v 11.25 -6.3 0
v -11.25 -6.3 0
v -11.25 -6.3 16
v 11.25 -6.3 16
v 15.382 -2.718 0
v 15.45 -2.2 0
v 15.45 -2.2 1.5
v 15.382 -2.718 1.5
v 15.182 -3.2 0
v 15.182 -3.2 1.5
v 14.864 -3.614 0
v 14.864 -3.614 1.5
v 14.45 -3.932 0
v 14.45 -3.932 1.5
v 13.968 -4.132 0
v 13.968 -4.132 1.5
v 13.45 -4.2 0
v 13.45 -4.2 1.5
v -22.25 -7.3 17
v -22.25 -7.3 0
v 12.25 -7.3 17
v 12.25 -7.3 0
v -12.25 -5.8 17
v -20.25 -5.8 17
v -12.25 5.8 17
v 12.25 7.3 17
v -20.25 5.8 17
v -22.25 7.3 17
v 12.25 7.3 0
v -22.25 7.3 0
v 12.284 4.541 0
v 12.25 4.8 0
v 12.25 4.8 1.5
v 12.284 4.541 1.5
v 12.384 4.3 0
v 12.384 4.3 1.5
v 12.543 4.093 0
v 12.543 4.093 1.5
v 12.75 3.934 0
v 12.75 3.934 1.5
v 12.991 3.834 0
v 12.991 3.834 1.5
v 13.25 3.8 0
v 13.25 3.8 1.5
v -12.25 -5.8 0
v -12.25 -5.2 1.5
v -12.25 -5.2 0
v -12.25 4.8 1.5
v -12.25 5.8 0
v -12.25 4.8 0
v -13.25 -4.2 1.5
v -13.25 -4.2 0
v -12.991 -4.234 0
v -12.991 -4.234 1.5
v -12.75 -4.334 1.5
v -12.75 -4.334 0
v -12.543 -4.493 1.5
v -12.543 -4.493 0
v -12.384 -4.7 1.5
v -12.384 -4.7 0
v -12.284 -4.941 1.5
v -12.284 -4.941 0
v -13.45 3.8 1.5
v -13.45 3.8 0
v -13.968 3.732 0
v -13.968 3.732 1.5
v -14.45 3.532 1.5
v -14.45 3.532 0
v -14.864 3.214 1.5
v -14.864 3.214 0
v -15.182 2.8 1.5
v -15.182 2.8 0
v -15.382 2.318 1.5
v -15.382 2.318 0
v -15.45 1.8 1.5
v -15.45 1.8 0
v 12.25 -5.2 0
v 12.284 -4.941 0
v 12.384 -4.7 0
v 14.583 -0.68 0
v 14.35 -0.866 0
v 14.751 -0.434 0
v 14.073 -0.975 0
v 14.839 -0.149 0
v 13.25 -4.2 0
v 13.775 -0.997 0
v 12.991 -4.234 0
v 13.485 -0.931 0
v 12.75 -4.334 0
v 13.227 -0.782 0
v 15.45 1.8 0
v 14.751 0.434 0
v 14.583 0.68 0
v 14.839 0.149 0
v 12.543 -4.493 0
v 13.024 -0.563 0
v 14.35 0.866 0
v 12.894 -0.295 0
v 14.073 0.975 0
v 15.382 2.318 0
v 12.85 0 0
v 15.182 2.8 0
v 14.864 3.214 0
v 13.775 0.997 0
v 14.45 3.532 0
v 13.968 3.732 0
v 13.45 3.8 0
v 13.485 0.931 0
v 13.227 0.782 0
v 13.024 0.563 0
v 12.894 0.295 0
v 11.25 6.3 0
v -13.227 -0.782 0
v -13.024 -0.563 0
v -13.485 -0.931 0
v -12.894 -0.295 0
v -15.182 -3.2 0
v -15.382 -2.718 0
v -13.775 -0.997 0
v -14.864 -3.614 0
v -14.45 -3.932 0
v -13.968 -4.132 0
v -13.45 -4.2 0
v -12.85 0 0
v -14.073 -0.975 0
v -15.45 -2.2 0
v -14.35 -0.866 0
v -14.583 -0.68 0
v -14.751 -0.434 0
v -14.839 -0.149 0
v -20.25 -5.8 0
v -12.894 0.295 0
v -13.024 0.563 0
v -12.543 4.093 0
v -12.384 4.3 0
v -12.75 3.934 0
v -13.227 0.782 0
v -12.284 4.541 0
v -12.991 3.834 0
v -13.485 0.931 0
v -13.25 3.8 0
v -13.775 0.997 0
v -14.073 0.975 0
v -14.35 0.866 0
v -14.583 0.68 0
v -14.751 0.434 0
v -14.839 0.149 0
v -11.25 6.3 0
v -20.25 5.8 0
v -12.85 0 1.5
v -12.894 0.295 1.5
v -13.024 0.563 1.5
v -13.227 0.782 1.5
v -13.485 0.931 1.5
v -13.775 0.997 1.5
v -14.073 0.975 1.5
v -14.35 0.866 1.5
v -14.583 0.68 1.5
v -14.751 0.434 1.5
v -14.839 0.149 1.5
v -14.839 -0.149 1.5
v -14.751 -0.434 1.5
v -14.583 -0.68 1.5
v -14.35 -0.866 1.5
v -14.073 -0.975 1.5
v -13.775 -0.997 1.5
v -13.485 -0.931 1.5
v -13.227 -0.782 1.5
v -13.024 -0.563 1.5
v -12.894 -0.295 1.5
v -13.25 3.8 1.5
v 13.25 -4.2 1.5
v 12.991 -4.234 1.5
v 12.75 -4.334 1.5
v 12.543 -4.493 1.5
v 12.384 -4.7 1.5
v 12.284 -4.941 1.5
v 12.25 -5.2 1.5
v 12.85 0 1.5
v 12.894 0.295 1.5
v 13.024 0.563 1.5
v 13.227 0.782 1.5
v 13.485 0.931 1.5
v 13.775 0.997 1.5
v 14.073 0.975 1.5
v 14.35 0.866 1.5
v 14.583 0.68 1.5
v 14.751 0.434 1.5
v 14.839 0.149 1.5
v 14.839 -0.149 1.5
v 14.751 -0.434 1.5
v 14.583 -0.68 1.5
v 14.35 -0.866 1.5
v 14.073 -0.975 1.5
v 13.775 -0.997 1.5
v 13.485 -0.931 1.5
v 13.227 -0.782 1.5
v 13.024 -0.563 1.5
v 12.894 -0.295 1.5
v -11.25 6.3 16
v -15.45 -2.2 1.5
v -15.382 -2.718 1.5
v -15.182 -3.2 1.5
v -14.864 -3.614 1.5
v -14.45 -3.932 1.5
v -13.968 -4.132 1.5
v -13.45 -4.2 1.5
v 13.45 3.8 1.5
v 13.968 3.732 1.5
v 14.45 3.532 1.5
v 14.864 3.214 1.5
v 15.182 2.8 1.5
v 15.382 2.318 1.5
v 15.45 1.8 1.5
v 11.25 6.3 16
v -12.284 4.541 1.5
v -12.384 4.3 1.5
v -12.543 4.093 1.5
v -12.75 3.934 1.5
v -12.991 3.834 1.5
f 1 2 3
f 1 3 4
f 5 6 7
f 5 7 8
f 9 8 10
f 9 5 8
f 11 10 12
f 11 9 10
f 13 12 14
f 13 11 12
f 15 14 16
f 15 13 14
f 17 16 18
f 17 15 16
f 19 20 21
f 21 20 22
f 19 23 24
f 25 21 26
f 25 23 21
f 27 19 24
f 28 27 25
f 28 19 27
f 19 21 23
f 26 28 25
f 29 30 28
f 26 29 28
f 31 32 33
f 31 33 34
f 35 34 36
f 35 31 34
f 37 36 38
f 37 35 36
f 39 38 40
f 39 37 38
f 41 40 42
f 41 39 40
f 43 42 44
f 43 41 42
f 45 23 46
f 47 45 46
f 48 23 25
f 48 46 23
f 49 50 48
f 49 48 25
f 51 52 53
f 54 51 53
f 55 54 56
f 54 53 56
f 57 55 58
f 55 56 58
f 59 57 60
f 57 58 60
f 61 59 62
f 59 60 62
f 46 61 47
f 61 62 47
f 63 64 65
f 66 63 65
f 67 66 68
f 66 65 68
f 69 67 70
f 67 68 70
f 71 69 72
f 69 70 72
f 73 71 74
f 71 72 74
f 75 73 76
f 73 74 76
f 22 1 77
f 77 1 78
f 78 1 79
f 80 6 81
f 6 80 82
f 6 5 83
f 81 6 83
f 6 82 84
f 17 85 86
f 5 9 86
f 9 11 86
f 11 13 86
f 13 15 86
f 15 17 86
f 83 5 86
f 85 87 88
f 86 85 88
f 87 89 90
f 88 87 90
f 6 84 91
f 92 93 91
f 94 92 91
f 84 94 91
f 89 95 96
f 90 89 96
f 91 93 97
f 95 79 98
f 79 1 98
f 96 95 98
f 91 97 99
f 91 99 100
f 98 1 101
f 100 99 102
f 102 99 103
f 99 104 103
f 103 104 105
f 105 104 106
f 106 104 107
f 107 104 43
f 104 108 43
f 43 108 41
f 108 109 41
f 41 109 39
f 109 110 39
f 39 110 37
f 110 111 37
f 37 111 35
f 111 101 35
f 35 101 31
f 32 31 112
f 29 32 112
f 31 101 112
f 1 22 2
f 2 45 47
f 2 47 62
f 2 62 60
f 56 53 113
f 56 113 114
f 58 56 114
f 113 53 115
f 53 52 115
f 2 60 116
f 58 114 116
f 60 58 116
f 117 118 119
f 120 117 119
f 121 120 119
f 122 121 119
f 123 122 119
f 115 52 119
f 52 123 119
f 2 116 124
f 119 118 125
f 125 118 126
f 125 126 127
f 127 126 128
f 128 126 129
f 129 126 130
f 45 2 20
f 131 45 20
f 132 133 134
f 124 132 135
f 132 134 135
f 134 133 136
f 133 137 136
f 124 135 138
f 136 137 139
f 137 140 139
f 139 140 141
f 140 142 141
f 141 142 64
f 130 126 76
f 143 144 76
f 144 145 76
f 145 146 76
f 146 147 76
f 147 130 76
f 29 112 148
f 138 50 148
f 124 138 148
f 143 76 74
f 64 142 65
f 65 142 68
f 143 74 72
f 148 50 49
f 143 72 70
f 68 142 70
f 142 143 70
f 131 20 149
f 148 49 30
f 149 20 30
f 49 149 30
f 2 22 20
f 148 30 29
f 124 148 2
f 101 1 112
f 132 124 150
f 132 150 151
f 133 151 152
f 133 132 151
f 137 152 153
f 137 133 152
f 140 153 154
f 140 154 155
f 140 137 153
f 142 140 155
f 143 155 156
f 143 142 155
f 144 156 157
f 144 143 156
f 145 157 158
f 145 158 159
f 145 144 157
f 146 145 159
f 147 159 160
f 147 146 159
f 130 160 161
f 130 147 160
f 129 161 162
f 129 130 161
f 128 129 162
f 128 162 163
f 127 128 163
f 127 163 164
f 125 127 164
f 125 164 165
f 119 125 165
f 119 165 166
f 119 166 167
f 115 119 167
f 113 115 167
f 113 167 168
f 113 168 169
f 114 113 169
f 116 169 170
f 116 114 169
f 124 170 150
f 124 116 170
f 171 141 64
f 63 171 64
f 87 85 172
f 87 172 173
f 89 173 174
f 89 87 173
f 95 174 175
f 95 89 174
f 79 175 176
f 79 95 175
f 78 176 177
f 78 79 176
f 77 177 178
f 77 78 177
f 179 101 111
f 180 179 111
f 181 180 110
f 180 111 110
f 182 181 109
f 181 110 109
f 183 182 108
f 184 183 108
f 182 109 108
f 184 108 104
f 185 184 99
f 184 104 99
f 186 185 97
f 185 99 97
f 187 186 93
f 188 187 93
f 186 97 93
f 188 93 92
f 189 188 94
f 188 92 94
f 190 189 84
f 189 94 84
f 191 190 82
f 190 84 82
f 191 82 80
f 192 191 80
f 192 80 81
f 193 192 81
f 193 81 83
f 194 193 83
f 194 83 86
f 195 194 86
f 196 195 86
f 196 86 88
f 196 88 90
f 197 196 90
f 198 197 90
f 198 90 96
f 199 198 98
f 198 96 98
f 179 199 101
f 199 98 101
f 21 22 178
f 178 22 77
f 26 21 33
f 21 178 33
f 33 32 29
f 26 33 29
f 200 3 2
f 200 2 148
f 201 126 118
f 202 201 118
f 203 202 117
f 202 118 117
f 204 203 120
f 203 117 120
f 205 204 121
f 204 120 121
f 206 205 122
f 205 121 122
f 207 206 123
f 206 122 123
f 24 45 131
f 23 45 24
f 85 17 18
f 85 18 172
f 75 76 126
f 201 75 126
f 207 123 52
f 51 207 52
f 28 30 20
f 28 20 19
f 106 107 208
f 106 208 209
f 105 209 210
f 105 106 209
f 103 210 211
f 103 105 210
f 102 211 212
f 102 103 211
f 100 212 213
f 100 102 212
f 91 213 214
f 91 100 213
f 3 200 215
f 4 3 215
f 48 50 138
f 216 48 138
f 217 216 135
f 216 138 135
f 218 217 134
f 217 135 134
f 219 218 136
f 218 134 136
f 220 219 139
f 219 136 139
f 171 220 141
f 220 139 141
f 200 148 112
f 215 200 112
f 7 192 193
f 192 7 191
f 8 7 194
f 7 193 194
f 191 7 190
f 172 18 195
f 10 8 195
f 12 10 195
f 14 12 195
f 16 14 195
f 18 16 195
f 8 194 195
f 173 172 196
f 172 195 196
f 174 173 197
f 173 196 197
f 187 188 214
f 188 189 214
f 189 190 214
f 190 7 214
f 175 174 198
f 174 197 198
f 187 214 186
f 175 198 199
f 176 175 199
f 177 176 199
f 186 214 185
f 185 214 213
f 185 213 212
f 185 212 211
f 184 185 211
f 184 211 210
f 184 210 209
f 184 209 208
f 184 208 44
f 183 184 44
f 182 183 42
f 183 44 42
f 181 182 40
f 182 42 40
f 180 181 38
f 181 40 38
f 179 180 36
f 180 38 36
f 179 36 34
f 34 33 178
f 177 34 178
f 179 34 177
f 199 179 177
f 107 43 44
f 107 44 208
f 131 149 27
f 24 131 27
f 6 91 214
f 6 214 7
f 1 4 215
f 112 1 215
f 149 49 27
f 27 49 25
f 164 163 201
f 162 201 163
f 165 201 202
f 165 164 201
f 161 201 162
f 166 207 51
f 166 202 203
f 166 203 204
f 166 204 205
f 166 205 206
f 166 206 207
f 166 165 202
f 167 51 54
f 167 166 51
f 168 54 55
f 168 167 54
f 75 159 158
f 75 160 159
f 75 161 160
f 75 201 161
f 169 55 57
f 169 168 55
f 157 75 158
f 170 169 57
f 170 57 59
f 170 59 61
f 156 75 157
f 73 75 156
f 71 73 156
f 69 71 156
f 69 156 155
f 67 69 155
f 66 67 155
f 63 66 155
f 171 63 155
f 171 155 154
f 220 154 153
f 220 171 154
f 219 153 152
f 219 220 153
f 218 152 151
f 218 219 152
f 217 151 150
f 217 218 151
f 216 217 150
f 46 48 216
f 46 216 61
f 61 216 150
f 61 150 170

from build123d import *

# Parameters (mm, degrees)
SKETCH1_W           = 22.5
SKETCH1_H           = 12.6
BOSS_EXTRUDE1_DEPTH = 16
SHELL2_T            = 1
SKETCH2_R           = 1
BOSS_EXTRUDE2_DEPTH = 1.5
SKETCH5_W           = 17
SKETCH5_H           = 1.5
BOSS_EXTRUDE3_DEPTH = 10
SKETCH6_W           = 17
SKETCH6_H           = 11.6
BOSS_EXTRUDE4_DEPTH = 2


with BuildPart() as part:
    # Sketch1 → Boss-Extrude1 (new body)
    with BuildSketch(Plane.XY):
        Rectangle(SKETCH1_W, SKETCH1_H)
    extrude(amount=BOSS_EXTRUDE1_DEPTH)

    # Shell2
    shell2_openings = [part.faces().sort_by_distance(p)[0] for p in [
        (0, 0, 0),
    ]]
    offset(amount=SHELL2_T, openings=shell2_openings, kind=Kind.INTERSECTION)

    # Sketch2 → Boss-Extrude2 (add)
    with BuildSketch(Plane(origin=(0, 0, 0), x_dir=(-1, 0, 0), z_dir=(0, 0, -1))):
        with BuildLine():
            Line((-13.45, -4.2), (-13.25, -4.2))
            ThreePointArc((-13.25, -4.2), (-12.542893219, -4.492893219), (-12.25, -5.2))
            Line((-12.25, -5.2), (-12.25, 4.8))
            ThreePointArc((-12.25, 4.8), (-12.542893219, 4.092893219), (-13.25, 3.8))
            Line((-13.25, 3.8), (-13.45, 3.8))
            ThreePointArc((-13.45, 3.8), (-14.864213562, 3.214213562), (-15.45, 1.8))
            Line((-15.45, 1.8), (-15.45, -2.2))
            ThreePointArc((-15.45, -2.2), (-14.864213562, -3.614213562), (-13.45, -4.2))
        make_face()
        with Locations((-13.85, 0)):
            Circle(SKETCH2_R, mode=Mode.SUBTRACT)
    boss_extrude2 = extrude(amount=-BOSS_EXTRUDE2_DEPTH)

    # Mirror1: Boss-Extrude2 across plane
    add(boss_extrude2.mirror(Plane(origin=(0, 0, 0), x_dir=(0, 0, 1), z_dir=(1, 0, 0))))

    # Sketch5 → Boss-Extrude3 (add)
    with BuildSketch(Plane.ZY.offset(12.25)):
        with Locations((8.5, 6.55)):
            Rectangle(SKETCH5_W, SKETCH5_H)
        with Locations((8.5, -6.55)):
            Rectangle(SKETCH5_W, SKETCH5_H)
    extrude(amount=BOSS_EXTRUDE3_DEPTH)

    # Sketch6 → Boss-Extrude4 (add)
    with BuildSketch(Plane.ZY.offset(22.25)):
        with Locations((8.5, 0)):
            Rectangle(SKETCH6_W, SKETCH6_H)
    extrude(amount=-BOSS_EXTRUDE4_DEPTH)


solid = part.part
